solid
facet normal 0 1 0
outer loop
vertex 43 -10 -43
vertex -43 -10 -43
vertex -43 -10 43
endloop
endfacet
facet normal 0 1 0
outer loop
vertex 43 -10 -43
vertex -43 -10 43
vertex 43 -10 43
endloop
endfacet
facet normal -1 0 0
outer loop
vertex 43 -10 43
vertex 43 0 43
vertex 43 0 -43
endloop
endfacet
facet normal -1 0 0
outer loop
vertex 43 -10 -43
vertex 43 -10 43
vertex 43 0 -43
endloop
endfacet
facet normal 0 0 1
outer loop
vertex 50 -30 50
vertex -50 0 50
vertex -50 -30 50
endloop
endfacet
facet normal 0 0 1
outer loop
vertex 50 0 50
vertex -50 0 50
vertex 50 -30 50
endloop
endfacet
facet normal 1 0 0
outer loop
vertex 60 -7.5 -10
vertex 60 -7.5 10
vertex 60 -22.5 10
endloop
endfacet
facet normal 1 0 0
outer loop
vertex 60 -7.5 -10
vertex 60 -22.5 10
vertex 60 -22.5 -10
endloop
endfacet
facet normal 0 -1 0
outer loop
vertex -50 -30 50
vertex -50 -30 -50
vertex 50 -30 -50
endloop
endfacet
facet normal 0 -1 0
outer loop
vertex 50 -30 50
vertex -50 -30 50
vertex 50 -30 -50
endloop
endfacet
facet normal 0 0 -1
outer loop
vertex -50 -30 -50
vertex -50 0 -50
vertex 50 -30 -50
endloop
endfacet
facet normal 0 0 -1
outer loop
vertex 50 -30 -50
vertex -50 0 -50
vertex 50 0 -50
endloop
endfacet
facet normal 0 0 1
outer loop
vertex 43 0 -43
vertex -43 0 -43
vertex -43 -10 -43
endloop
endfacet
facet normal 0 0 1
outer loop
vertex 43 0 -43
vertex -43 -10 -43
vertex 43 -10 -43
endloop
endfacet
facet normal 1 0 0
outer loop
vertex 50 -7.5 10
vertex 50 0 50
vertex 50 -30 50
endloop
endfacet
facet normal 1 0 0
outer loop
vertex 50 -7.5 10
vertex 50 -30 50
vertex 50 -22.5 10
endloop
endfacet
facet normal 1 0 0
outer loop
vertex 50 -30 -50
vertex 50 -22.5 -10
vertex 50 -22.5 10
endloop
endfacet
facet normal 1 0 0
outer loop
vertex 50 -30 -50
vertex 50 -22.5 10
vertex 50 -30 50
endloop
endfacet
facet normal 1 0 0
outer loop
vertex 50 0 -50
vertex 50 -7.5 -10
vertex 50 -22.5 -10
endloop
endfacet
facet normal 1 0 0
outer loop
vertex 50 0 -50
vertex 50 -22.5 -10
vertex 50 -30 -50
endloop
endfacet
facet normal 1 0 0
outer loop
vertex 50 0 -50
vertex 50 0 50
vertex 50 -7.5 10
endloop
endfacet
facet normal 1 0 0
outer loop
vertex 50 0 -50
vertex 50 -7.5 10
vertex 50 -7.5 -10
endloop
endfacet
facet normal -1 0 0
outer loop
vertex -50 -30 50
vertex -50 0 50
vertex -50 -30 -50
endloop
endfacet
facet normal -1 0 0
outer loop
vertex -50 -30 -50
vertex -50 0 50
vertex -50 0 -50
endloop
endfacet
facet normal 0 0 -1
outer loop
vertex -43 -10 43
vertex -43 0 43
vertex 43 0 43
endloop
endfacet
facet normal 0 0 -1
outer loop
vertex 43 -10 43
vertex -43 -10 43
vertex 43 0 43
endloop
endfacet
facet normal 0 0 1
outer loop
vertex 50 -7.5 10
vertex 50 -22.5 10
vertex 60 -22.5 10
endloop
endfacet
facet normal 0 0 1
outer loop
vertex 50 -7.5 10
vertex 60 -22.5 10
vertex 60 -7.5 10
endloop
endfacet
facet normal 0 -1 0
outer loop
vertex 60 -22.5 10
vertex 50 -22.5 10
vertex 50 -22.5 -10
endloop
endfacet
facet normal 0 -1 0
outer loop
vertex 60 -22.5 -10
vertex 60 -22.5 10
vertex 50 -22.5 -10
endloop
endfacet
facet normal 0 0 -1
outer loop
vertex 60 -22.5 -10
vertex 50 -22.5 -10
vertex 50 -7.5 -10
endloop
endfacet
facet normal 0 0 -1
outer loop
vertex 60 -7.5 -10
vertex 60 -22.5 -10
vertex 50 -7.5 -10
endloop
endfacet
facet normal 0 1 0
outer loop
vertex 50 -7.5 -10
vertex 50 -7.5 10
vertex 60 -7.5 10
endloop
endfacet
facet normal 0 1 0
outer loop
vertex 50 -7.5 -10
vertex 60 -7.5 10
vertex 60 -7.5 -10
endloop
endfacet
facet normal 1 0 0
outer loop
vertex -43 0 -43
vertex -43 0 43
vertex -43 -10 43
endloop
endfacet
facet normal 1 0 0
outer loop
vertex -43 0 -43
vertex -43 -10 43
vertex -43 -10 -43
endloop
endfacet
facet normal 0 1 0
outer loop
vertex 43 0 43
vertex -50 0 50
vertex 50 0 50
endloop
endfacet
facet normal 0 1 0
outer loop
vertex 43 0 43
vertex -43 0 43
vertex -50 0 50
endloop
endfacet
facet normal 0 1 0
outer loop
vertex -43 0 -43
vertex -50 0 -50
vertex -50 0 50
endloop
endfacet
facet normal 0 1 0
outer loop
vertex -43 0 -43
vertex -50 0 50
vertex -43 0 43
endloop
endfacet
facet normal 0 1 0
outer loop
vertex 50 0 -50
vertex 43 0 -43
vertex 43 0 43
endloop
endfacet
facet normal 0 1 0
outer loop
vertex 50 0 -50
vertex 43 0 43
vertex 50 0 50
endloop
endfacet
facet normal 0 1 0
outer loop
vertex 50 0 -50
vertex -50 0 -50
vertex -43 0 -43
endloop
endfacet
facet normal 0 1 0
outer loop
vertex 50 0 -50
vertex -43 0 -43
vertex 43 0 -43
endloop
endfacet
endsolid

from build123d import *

# Parameters (mm, degrees)
SKETCH1_W           = 100
SKETCH1_H           = 100
BOSS_EXTRUDE1_DEPTH = 30
SKETCH2_W           = 86
SKETCH2_H           = 86
CUT_EXTRUDE1_DEPTH  = 10
SKETCH3_W           = 20
SKETCH3_H           = 15
BOSS_EXTRUDE2_DEPTH = 10


with BuildPart() as part:
    # Sketch1 → Boss-Extrude1 (new body)
    with BuildSketch(Plane(origin=(0, 0, 0), x_dir=(1, 0, 0), z_dir=(0, 1, 0))):
        Rectangle(SKETCH1_W, SKETCH1_H)
    extrude(amount=-BOSS_EXTRUDE1_DEPTH)

    # Sketch2 → Cut-Extrude1 (cut)
    with BuildSketch(Plane(origin=(0, 0, 0), x_dir=(1, 0, 0), z_dir=(0, 1, 0))):
        Rectangle(SKETCH2_W, SKETCH2_H)
    extrude(amount=-CUT_EXTRUDE1_DEPTH, mode=Mode.SUBTRACT)

    # Sketch3 → Boss-Extrude2 (add)
    with BuildSketch(Plane(origin=(50, 0, 0), x_dir=(0, 0, -1), z_dir=(1, 0, 0))):
        with Locations((0, -15)):
            Rectangle(SKETCH3_W, SKETCH3_H)
    extrude(amount=BOSS_EXTRUDE2_DEPTH)


solid = part.part
